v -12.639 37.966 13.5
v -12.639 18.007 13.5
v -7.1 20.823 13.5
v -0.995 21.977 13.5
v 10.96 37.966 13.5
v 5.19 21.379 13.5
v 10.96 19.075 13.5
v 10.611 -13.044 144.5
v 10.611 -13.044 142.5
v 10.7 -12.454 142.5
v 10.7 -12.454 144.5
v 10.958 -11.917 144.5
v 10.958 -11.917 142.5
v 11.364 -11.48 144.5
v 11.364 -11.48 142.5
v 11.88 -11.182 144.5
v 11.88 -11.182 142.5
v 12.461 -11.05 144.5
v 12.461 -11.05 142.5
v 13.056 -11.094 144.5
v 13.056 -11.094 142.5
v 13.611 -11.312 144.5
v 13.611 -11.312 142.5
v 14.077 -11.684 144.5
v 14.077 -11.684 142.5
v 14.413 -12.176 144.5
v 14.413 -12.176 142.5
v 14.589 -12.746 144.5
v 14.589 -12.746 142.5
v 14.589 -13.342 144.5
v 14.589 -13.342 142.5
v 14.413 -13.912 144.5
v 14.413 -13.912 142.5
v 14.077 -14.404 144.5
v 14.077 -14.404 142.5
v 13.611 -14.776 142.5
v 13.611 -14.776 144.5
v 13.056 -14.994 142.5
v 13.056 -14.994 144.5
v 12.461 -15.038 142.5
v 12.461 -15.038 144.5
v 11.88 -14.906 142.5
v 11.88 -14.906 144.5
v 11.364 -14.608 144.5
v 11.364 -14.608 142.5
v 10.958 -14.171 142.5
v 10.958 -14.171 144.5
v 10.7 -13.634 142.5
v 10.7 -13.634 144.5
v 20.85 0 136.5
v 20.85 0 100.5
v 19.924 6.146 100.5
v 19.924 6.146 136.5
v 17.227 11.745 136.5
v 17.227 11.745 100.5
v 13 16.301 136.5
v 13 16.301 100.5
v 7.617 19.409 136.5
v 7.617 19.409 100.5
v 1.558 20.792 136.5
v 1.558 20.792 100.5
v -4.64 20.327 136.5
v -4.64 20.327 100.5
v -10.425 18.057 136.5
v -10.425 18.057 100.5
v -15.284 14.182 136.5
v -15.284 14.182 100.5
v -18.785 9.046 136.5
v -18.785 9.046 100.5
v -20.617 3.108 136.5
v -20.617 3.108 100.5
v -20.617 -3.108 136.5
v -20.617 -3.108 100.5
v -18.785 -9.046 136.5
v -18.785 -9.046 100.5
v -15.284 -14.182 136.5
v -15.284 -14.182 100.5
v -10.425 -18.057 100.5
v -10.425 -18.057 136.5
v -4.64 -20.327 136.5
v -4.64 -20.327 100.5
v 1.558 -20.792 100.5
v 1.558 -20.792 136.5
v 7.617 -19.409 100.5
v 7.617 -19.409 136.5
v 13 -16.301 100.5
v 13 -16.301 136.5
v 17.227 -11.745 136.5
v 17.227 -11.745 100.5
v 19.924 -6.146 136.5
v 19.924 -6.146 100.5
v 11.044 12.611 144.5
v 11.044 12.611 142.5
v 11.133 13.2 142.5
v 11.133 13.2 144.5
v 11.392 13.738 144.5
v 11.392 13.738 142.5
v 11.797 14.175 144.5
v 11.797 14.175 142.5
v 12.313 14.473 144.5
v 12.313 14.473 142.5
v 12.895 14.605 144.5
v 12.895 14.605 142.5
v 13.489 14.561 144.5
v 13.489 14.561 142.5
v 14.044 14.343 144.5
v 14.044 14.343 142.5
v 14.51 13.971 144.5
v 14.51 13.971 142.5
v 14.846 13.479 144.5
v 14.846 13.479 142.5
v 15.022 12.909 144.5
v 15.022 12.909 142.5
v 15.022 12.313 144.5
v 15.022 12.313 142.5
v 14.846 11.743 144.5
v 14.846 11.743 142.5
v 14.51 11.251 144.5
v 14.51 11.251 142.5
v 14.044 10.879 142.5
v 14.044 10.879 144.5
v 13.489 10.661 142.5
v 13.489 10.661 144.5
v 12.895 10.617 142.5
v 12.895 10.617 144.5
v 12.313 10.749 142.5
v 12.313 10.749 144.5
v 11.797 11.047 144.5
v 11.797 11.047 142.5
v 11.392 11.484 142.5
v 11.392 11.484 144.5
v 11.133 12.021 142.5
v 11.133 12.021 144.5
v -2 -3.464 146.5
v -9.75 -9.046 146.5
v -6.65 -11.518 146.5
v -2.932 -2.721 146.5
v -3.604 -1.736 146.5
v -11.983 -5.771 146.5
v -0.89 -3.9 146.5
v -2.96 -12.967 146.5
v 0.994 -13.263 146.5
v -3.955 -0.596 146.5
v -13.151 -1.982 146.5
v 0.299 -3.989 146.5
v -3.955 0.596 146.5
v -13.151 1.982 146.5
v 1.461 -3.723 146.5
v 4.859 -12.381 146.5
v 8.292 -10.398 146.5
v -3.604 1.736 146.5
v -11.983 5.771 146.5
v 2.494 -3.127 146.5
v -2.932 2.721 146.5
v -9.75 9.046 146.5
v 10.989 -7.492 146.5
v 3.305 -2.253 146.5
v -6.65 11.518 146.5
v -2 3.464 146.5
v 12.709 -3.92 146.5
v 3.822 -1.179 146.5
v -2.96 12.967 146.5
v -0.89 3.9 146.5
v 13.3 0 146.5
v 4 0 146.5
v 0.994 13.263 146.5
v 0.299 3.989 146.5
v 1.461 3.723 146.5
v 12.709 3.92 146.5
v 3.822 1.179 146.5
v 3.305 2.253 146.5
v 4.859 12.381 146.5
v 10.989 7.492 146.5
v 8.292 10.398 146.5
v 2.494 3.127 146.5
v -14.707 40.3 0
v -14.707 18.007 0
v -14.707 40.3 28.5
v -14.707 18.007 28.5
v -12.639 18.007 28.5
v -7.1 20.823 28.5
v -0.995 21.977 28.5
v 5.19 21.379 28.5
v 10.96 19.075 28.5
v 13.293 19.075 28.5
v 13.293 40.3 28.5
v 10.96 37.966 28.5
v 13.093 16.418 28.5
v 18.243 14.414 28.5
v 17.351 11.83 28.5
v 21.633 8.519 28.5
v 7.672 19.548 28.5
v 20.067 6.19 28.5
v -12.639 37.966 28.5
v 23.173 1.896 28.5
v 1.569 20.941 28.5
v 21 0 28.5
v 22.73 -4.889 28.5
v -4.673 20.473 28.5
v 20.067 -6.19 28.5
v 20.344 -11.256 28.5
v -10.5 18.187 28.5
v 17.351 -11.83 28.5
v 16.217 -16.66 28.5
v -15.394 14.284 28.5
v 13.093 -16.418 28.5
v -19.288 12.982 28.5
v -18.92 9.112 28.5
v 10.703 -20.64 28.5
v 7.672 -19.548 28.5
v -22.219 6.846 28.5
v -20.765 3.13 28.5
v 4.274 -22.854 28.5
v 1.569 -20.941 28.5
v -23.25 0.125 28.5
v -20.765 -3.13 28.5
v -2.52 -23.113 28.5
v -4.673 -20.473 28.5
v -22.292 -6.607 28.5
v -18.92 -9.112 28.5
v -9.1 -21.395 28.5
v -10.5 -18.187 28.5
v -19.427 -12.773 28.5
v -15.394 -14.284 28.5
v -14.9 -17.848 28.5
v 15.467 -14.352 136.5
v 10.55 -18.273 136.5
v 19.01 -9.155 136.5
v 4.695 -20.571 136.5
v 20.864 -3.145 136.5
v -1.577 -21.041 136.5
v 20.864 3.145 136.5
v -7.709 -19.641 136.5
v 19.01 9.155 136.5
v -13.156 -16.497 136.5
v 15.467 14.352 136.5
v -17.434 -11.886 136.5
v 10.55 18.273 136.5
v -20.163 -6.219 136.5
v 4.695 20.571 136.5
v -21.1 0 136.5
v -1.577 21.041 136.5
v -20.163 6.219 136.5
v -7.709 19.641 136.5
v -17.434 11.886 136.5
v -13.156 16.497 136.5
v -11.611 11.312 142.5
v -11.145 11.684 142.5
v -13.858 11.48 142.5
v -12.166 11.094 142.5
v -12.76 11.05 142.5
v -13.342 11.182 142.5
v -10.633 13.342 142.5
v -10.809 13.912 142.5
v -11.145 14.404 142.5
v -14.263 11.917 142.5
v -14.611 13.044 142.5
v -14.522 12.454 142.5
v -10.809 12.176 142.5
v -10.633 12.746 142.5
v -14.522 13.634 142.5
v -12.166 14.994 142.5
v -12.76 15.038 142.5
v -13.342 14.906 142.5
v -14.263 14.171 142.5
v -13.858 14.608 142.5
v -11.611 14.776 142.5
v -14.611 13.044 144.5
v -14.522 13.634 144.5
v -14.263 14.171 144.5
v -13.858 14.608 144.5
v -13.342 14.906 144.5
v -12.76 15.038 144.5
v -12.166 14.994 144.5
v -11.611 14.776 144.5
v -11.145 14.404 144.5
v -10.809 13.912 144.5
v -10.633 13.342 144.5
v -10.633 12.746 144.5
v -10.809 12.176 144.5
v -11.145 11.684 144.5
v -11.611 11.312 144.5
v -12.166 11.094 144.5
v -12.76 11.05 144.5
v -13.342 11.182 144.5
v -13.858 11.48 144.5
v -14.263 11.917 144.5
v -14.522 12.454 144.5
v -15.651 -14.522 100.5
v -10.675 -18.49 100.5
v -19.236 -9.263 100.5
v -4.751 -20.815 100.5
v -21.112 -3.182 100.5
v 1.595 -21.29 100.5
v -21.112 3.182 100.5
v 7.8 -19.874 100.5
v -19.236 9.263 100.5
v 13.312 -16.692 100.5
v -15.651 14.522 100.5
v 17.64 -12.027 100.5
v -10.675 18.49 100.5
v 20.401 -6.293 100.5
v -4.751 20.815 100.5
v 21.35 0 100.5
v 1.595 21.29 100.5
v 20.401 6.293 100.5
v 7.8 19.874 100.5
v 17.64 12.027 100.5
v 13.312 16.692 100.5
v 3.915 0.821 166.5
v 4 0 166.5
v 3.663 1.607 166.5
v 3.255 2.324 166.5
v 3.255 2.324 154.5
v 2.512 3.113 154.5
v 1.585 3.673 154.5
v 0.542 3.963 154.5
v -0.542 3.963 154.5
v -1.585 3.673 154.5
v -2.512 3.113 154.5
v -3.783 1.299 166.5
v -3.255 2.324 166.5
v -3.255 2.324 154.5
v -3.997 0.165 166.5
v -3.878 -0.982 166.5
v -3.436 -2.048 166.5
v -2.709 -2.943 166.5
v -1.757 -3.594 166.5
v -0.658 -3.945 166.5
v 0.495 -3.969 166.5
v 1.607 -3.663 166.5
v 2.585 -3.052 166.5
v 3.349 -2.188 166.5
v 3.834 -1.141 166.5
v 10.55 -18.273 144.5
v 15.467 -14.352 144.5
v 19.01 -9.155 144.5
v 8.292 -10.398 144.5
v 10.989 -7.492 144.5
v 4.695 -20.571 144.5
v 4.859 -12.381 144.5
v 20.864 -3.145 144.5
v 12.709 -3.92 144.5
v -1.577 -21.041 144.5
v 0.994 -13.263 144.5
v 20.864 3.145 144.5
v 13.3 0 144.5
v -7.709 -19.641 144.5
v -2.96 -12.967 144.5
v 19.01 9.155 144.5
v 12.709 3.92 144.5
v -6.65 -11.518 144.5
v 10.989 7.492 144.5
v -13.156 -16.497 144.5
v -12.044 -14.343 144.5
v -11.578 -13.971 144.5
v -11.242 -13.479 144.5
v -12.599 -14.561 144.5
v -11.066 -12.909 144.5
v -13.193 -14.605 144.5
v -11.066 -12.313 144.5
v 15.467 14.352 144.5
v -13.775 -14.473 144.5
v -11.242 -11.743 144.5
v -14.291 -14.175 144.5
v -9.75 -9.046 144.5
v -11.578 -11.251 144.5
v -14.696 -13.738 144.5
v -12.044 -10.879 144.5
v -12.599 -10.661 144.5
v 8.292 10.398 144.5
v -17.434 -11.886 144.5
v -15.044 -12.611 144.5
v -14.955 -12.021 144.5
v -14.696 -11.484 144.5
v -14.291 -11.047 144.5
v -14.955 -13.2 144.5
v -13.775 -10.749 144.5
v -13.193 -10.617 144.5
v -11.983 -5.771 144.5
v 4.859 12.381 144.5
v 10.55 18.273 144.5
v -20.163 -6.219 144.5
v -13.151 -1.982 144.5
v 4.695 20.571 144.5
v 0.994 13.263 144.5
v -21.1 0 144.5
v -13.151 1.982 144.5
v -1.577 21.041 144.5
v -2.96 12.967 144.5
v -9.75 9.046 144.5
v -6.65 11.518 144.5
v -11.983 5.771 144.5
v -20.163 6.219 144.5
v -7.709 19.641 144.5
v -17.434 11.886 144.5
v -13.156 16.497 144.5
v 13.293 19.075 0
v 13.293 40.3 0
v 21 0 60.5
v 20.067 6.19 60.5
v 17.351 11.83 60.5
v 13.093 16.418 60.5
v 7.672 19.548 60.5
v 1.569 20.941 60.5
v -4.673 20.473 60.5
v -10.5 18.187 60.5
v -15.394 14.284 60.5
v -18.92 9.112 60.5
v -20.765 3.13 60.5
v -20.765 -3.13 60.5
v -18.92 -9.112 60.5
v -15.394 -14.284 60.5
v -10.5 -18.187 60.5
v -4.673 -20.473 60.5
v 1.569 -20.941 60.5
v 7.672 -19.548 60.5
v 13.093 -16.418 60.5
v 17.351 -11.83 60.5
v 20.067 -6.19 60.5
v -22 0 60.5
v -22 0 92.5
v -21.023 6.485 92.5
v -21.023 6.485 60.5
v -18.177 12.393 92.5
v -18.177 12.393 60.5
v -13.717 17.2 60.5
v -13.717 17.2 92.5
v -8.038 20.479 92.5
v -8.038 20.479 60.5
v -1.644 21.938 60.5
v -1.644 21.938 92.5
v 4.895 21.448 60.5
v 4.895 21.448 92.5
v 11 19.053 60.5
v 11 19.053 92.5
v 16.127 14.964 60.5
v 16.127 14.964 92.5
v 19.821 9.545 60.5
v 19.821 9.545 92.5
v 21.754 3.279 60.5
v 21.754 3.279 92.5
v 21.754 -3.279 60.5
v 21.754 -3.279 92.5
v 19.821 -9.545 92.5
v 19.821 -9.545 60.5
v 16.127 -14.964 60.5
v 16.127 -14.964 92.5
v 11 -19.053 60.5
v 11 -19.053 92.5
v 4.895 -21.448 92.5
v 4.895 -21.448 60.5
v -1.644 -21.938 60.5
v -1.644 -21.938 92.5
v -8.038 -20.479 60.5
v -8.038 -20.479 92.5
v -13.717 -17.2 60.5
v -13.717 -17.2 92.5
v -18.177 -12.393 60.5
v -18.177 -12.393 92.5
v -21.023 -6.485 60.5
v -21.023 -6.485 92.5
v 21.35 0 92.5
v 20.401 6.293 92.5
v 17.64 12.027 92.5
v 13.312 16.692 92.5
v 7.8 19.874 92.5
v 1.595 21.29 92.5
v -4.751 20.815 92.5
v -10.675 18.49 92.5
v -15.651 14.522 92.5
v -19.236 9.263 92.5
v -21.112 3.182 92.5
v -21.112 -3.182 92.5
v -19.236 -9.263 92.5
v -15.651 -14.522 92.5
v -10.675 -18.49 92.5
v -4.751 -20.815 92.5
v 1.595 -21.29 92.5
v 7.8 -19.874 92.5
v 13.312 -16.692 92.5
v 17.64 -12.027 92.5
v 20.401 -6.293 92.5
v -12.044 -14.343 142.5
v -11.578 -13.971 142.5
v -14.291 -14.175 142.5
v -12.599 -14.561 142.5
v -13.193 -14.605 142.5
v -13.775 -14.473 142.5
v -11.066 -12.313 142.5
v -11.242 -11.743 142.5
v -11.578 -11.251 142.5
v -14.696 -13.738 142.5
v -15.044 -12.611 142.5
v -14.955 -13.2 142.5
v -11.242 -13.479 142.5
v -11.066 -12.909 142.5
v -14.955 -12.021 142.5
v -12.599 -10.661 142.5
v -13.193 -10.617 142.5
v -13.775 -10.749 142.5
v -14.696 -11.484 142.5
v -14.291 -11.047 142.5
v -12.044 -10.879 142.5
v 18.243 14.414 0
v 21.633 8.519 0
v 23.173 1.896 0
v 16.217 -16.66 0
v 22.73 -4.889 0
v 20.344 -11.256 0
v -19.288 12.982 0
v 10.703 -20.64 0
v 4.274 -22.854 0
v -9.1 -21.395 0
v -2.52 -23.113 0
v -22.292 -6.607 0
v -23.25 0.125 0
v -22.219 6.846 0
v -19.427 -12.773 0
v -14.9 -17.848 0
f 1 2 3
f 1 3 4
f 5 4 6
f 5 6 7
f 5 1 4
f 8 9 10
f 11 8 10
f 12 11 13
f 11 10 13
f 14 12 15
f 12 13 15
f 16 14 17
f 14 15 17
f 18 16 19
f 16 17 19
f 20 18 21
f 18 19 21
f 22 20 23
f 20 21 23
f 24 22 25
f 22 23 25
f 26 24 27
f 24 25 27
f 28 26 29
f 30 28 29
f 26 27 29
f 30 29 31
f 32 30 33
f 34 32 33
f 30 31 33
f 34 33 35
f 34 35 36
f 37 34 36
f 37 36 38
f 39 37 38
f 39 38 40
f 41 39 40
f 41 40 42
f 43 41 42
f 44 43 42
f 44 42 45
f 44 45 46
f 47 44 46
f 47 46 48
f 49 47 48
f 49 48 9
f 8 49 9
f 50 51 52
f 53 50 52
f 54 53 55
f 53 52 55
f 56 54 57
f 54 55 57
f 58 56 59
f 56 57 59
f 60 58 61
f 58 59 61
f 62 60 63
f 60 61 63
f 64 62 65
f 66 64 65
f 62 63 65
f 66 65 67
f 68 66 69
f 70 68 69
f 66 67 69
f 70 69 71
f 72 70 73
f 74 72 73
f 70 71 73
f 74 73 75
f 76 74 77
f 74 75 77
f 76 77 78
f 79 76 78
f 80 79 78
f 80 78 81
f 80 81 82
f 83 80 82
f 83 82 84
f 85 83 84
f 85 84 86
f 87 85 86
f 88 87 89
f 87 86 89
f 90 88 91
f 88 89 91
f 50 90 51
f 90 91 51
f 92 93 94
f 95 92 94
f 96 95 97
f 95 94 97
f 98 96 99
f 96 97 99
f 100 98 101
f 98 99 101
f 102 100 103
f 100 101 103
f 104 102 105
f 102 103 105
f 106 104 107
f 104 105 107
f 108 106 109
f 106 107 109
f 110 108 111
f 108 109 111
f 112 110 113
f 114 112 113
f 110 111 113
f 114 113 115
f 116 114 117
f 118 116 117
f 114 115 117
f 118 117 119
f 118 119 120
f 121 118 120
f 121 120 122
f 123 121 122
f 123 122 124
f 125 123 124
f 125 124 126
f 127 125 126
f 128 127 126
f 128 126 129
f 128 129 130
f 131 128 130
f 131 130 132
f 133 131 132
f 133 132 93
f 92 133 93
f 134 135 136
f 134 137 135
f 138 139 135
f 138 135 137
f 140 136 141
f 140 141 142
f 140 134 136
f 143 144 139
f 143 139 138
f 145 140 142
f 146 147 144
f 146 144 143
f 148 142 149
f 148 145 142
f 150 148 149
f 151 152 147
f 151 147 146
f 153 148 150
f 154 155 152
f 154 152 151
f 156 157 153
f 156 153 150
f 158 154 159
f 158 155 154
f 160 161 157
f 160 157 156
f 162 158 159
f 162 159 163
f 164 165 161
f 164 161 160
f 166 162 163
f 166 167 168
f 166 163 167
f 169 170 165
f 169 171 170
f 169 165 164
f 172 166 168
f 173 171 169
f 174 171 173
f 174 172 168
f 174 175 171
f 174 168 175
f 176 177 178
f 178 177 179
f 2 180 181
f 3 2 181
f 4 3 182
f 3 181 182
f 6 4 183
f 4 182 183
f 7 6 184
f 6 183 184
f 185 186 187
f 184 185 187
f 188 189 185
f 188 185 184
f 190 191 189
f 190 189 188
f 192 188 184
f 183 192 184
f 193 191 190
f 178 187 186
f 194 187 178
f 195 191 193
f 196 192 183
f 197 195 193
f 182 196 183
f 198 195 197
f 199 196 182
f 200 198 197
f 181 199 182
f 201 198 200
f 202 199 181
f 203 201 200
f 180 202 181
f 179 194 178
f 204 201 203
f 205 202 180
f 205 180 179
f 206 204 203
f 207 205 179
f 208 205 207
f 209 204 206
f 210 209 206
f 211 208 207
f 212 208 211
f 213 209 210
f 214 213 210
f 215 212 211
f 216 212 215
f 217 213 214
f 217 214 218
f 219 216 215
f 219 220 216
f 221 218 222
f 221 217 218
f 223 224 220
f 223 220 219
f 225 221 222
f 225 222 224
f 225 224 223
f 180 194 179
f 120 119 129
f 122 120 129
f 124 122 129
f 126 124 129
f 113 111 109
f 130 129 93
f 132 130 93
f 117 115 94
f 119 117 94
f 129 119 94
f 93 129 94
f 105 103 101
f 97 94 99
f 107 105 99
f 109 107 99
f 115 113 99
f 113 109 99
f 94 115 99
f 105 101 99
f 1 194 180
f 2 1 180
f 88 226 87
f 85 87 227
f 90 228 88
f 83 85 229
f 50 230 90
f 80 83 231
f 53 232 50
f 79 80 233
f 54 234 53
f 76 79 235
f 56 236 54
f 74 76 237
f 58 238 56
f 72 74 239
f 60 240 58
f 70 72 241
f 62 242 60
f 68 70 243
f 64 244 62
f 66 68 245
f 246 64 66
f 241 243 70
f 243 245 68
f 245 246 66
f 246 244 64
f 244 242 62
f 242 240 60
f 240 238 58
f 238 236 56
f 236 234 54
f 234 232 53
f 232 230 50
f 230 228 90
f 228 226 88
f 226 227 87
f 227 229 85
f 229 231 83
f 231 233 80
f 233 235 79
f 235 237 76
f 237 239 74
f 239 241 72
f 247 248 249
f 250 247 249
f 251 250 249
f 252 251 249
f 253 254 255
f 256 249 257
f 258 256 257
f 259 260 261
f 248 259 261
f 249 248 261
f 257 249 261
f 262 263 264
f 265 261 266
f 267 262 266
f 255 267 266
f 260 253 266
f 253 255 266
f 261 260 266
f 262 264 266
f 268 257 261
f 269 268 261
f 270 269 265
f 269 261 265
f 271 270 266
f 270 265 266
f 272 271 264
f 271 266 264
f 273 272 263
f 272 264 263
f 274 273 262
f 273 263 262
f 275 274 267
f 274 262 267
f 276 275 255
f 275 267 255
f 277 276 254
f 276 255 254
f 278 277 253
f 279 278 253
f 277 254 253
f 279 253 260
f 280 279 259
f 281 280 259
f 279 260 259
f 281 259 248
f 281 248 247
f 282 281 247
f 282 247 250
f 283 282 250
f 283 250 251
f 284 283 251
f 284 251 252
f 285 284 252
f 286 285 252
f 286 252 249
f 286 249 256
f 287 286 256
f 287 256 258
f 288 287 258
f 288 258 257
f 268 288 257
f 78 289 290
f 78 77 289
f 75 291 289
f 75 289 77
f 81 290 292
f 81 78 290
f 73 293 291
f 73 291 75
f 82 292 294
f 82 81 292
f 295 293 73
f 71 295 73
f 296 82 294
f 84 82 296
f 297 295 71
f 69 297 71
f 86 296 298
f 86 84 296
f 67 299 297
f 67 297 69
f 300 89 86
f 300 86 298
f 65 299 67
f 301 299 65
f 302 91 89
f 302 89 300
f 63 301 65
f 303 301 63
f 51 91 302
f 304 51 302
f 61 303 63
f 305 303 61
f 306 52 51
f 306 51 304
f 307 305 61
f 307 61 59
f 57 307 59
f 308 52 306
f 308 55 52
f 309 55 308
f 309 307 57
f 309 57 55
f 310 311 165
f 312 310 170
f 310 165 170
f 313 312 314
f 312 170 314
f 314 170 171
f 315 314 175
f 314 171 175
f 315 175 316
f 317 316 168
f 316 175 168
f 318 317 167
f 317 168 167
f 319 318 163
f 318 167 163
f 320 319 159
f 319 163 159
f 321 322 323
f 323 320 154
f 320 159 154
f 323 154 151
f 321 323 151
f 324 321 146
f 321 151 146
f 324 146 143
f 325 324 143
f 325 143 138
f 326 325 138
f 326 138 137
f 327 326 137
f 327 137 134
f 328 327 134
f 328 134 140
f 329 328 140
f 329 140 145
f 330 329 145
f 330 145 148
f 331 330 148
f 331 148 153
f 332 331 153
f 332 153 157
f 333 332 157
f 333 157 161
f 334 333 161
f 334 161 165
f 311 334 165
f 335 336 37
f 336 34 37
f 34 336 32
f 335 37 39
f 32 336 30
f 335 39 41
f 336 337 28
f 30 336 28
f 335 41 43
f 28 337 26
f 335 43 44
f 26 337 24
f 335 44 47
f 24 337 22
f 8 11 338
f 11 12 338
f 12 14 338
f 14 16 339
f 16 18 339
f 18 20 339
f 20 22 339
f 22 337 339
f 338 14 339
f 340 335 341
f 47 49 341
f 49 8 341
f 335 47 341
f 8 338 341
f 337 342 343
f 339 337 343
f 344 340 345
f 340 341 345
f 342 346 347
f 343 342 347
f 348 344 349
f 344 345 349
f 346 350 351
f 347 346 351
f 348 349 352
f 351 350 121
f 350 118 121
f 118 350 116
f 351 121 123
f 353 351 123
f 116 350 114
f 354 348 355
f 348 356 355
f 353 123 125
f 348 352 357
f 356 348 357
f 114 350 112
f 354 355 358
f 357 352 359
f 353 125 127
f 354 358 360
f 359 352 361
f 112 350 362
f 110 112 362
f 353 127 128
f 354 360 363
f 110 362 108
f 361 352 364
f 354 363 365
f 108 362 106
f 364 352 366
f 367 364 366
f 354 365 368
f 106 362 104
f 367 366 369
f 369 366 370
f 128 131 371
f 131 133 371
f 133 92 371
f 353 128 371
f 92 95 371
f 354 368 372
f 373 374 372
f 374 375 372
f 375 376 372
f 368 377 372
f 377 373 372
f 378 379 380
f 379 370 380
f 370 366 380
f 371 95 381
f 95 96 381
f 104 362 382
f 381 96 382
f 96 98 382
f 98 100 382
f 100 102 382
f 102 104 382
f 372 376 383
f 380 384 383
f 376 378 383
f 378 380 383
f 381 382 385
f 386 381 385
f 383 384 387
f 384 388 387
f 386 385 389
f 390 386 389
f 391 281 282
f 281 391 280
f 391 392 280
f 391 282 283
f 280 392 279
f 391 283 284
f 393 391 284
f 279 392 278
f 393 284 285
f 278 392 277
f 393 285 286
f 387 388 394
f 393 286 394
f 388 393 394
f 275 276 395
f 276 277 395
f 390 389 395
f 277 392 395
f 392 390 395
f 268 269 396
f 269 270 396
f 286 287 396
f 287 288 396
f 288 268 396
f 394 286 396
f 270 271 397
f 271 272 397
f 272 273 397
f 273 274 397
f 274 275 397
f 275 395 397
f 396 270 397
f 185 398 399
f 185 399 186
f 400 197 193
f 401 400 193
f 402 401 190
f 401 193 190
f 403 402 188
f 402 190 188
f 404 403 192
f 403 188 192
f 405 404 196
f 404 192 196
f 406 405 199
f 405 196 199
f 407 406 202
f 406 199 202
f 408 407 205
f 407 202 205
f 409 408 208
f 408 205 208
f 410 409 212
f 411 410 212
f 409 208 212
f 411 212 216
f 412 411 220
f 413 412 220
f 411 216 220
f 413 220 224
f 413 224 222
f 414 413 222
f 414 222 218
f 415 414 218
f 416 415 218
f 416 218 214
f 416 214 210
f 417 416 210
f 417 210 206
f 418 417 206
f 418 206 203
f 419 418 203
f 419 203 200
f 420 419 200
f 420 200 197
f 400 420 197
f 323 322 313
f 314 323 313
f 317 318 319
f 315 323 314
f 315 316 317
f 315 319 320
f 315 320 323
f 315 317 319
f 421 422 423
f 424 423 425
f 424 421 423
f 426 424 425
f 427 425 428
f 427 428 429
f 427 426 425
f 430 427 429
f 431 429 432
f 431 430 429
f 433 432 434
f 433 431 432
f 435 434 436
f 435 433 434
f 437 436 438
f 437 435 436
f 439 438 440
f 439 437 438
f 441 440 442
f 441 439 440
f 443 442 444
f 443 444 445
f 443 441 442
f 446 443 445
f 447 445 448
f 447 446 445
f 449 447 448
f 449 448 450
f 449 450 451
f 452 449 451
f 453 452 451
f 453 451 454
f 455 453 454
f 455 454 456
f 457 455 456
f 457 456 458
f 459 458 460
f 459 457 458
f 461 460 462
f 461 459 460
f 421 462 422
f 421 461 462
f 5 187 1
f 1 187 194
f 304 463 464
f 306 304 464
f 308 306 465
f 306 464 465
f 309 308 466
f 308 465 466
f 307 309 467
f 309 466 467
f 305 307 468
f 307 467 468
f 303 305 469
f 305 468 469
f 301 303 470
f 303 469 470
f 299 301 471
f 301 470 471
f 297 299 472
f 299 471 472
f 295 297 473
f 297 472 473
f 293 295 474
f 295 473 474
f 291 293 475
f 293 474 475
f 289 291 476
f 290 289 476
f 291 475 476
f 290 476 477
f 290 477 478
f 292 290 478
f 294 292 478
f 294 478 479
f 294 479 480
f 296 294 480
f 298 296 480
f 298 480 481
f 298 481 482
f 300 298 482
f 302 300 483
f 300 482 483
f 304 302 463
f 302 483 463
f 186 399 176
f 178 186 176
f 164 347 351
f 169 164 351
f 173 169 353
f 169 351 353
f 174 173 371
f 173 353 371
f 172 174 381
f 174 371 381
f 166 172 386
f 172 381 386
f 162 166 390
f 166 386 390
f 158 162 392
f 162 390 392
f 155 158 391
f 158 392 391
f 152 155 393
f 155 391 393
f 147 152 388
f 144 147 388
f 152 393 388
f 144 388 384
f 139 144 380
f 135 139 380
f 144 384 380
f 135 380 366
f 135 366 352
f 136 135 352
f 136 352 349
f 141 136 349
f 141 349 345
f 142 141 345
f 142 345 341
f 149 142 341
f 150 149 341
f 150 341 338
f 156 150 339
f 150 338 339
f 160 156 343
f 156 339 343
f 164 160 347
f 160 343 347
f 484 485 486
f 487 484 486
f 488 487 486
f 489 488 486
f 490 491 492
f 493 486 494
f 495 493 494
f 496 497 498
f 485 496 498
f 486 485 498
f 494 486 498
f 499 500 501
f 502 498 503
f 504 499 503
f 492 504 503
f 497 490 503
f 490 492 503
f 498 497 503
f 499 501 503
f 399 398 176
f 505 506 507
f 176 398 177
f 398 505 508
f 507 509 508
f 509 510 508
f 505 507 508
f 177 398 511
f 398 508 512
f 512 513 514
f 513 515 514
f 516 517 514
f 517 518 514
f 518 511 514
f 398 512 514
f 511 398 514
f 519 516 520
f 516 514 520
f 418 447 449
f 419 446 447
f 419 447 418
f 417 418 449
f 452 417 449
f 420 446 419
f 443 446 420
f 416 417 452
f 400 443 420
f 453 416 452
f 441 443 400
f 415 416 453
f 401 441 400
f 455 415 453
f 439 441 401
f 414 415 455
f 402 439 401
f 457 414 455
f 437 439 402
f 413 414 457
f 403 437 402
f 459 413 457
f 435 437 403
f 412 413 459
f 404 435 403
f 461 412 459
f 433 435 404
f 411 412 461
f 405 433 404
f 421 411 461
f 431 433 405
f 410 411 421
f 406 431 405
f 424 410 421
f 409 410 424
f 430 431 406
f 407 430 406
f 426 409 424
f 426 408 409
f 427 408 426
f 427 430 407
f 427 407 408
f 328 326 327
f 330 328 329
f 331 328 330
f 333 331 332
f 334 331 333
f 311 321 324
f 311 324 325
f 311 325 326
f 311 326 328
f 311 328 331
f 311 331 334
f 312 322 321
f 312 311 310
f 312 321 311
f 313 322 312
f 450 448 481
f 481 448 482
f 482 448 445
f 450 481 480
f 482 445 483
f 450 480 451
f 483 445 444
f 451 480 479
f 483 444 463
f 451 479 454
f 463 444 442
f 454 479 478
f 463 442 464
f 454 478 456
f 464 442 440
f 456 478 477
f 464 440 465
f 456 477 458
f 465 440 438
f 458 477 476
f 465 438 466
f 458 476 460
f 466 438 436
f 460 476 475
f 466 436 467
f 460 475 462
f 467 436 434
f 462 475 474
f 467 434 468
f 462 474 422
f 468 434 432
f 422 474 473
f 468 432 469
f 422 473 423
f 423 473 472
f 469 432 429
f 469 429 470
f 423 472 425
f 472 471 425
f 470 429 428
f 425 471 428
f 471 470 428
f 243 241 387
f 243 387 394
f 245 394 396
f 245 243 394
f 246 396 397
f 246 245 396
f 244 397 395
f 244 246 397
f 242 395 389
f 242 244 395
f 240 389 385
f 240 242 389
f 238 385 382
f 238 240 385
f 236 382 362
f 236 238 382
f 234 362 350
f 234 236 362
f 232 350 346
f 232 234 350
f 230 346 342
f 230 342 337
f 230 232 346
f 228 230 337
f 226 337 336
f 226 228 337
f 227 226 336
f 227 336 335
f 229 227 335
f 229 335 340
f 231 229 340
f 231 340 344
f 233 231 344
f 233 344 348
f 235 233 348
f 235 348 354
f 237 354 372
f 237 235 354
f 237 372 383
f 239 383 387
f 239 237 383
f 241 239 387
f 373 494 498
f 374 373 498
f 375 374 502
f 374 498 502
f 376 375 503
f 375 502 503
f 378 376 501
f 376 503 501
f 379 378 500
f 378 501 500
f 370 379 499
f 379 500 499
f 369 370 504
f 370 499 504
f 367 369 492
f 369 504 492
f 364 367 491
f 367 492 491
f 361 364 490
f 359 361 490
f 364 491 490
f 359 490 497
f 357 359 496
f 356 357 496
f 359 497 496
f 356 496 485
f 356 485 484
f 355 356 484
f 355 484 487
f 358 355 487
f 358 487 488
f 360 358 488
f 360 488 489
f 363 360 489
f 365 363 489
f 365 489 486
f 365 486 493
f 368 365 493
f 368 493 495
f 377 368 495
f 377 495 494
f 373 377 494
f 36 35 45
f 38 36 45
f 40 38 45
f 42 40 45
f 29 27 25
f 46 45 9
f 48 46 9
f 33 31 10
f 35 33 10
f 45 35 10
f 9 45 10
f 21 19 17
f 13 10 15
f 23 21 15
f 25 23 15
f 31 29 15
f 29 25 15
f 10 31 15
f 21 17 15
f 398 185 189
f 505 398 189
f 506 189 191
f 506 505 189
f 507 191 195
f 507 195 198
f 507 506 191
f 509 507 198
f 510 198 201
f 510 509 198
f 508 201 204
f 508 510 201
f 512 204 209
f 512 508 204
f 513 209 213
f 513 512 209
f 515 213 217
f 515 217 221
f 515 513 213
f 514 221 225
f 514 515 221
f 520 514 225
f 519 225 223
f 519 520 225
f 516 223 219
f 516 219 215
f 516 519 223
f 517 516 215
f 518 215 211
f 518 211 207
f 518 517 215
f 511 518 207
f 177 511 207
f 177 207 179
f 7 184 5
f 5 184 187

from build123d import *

# Parameters (mm, degrees)
BOSS_EXTRUDE1_DEPTH          = 28.5
SKETCH2_R                    = 21
BOSS_EXTRUDE2_DEPTH          = 32
SKETCH3_R                    = 22
BOSS_EXTRUDE3_DEPTH          = 32
SKETCH4_R                    = 21.35
BOSS_EXTRUDE4_DEPTH          = 8
SKETCH5_R                    = 20.85
BOSS_EXTRUDE5_DEPTH          = 36
SKETCH6_W                    = 28
SKETCH6_H                    = 28.5
BOSS_EXTRUDE6_DEPTH          = 21.22463282
SKETCH7_R                    = 21.1
BOSS_EXTRUDE7_DEPTH          = 8
SKETCH8_R                    = 13.3
BOSS_EXTRUDE8_DEPTH          = 2
SKETCH9_R                    = 4
BOSS_EXTRUDE9_DEPTH          = 20
CUT_EXTRUDE1_DEPTH           = 12
CUT_EXTRUDE2_DEPTH           = 15
F_4_0_4_DIAMETER_HOLE1_D     = 4
F_4_0_4_DIAMETER_HOLE1_DEPTH = 2


with BuildPart() as part:
    # Sketch1 → Boss-Extrude1 (new body)
    with BuildSketch(Plane(origin=(0, 0, 0), x_dir=(-1, 0, 0), z_dir=(0, 0, -1))):
        with BuildLine():
            Line((14.707413083, 18.007068068), (14.707413083, 19.07536718))
            Line((14.707413083, 19.07536718), (-13.292586917, 19.07536718))
            ThreePointArc((-13.292586917, 19.07536718), (-0.886424853, -23.233096027), (14.707413083, 18.007068068))
        make_face()
    extrude(amount=-BOSS_EXTRUDE1_DEPTH)

    # Sketch2 → Boss-Extrude2 (add)
    with BuildSketch(Plane.XY.offset(28.5)):
        Circle(SKETCH2_R)
    extrude(amount=BOSS_EXTRUDE2_DEPTH)

    # Sketch3 → Boss-Extrude3 (add)
    with BuildSketch(Plane(origin=(0, 0, 60.5), x_dir=(-1, 0, 0), z_dir=(0, 0, -1))):
        Circle(SKETCH3_R)
    extrude(amount=-BOSS_EXTRUDE3_DEPTH)

    # Sketch4 → Boss-Extrude4 (add)
    with BuildSketch(Plane.XY.offset(92.5)):
        Circle(SKETCH4_R)
    extrude(amount=BOSS_EXTRUDE4_DEPTH)

    # Sketch5 → Boss-Extrude5 (add)
    with BuildSketch(Plane.XY.offset(100.5)):
        Circle(SKETCH5_R)
    extrude(amount=BOSS_EXTRUDE5_DEPTH)

    # Sketch6 → Boss-Extrude6 (add)
    with BuildSketch(Plane(origin=(0, 19.07536718, 0), x_dir=(-1, 0, 0), z_dir=(0, 1, 0))):
        with Locations((0.707413083, 14.25)):
            Rectangle(SKETCH6_W, SKETCH6_H)
    extrude(amount=BOSS_EXTRUDE6_DEPTH)

    # Sketch7 → Boss-Extrude7 (add)
    with BuildSketch(Plane(origin=(0, 0, 136.5), x_dir=(-1, 0, 0), z_dir=(0, 0, -1))):
        Circle(SKETCH7_R)
    extrude(amount=-BOSS_EXTRUDE7_DEPTH)

    # Sketch8 → Boss-Extrude8 (add)
    with BuildSketch(Plane.XY.offset(144.5)):
        Circle(SKETCH8_R)
    extrude(amount=BOSS_EXTRUDE8_DEPTH)

    # Sketch9 → Boss-Extrude9 (add)
    with BuildSketch(Plane.XY.offset(146.5)):
        Circle(SKETCH9_R)
    extrude(amount=BOSS_EXTRUDE9_DEPTH)

    # Sketch10 → Cut-Extrude1 (cut)
    with BuildSketch(Plane.XY.offset(166.5)):
        with BuildLine():
            Line((-3.255366619, 2.324346828), (3.255366619, 2.324346828))
            ThreePointArc((3.255366619, 2.324346828), (0, 4), (-3.255366619, 2.324346828))
        make_face()
    extrude(amount=-CUT_EXTRUDE1_DEPTH, mode=Mode.SUBTRACT)

    # Sketch11 → Cut-Extrude2 (cut)
    with BuildSketch(Plane.XY.offset(28.5)):
        with BuildLine():
            Line((10.960399944, 19.07536718), (10.960399944, 37.965647442))
            Line((10.960399944, 37.965647442), (-12.639046626, 37.965647442))
            Line((-12.639046626, 37.965647442), (-12.639046626, 18.007068068))
            ThreePointArc((-12.639046626, 18.007068068), (-0.994876585, 21.977493501), (10.960399944, 19.07536718))
        make_face()
    extrude(amount=-CUT_EXTRUDE2_DEPTH, mode=Mode.SUBTRACT)

    # Ø4.0 (4) Diameter Hole1
    with Locations(Plane.XY.offset(144.5)):
        with Locations((-13.043990964, -12.610936722), (12.610936722, -13.043990964), (13.043990964, 12.610936722), (-12.610936722, 13.043990964)):
            Hole(F_4_0_4_DIAMETER_HOLE1_D / 2, depth=F_4_0_4_DIAMETER_HOLE1_DEPTH)


solid = part.part
